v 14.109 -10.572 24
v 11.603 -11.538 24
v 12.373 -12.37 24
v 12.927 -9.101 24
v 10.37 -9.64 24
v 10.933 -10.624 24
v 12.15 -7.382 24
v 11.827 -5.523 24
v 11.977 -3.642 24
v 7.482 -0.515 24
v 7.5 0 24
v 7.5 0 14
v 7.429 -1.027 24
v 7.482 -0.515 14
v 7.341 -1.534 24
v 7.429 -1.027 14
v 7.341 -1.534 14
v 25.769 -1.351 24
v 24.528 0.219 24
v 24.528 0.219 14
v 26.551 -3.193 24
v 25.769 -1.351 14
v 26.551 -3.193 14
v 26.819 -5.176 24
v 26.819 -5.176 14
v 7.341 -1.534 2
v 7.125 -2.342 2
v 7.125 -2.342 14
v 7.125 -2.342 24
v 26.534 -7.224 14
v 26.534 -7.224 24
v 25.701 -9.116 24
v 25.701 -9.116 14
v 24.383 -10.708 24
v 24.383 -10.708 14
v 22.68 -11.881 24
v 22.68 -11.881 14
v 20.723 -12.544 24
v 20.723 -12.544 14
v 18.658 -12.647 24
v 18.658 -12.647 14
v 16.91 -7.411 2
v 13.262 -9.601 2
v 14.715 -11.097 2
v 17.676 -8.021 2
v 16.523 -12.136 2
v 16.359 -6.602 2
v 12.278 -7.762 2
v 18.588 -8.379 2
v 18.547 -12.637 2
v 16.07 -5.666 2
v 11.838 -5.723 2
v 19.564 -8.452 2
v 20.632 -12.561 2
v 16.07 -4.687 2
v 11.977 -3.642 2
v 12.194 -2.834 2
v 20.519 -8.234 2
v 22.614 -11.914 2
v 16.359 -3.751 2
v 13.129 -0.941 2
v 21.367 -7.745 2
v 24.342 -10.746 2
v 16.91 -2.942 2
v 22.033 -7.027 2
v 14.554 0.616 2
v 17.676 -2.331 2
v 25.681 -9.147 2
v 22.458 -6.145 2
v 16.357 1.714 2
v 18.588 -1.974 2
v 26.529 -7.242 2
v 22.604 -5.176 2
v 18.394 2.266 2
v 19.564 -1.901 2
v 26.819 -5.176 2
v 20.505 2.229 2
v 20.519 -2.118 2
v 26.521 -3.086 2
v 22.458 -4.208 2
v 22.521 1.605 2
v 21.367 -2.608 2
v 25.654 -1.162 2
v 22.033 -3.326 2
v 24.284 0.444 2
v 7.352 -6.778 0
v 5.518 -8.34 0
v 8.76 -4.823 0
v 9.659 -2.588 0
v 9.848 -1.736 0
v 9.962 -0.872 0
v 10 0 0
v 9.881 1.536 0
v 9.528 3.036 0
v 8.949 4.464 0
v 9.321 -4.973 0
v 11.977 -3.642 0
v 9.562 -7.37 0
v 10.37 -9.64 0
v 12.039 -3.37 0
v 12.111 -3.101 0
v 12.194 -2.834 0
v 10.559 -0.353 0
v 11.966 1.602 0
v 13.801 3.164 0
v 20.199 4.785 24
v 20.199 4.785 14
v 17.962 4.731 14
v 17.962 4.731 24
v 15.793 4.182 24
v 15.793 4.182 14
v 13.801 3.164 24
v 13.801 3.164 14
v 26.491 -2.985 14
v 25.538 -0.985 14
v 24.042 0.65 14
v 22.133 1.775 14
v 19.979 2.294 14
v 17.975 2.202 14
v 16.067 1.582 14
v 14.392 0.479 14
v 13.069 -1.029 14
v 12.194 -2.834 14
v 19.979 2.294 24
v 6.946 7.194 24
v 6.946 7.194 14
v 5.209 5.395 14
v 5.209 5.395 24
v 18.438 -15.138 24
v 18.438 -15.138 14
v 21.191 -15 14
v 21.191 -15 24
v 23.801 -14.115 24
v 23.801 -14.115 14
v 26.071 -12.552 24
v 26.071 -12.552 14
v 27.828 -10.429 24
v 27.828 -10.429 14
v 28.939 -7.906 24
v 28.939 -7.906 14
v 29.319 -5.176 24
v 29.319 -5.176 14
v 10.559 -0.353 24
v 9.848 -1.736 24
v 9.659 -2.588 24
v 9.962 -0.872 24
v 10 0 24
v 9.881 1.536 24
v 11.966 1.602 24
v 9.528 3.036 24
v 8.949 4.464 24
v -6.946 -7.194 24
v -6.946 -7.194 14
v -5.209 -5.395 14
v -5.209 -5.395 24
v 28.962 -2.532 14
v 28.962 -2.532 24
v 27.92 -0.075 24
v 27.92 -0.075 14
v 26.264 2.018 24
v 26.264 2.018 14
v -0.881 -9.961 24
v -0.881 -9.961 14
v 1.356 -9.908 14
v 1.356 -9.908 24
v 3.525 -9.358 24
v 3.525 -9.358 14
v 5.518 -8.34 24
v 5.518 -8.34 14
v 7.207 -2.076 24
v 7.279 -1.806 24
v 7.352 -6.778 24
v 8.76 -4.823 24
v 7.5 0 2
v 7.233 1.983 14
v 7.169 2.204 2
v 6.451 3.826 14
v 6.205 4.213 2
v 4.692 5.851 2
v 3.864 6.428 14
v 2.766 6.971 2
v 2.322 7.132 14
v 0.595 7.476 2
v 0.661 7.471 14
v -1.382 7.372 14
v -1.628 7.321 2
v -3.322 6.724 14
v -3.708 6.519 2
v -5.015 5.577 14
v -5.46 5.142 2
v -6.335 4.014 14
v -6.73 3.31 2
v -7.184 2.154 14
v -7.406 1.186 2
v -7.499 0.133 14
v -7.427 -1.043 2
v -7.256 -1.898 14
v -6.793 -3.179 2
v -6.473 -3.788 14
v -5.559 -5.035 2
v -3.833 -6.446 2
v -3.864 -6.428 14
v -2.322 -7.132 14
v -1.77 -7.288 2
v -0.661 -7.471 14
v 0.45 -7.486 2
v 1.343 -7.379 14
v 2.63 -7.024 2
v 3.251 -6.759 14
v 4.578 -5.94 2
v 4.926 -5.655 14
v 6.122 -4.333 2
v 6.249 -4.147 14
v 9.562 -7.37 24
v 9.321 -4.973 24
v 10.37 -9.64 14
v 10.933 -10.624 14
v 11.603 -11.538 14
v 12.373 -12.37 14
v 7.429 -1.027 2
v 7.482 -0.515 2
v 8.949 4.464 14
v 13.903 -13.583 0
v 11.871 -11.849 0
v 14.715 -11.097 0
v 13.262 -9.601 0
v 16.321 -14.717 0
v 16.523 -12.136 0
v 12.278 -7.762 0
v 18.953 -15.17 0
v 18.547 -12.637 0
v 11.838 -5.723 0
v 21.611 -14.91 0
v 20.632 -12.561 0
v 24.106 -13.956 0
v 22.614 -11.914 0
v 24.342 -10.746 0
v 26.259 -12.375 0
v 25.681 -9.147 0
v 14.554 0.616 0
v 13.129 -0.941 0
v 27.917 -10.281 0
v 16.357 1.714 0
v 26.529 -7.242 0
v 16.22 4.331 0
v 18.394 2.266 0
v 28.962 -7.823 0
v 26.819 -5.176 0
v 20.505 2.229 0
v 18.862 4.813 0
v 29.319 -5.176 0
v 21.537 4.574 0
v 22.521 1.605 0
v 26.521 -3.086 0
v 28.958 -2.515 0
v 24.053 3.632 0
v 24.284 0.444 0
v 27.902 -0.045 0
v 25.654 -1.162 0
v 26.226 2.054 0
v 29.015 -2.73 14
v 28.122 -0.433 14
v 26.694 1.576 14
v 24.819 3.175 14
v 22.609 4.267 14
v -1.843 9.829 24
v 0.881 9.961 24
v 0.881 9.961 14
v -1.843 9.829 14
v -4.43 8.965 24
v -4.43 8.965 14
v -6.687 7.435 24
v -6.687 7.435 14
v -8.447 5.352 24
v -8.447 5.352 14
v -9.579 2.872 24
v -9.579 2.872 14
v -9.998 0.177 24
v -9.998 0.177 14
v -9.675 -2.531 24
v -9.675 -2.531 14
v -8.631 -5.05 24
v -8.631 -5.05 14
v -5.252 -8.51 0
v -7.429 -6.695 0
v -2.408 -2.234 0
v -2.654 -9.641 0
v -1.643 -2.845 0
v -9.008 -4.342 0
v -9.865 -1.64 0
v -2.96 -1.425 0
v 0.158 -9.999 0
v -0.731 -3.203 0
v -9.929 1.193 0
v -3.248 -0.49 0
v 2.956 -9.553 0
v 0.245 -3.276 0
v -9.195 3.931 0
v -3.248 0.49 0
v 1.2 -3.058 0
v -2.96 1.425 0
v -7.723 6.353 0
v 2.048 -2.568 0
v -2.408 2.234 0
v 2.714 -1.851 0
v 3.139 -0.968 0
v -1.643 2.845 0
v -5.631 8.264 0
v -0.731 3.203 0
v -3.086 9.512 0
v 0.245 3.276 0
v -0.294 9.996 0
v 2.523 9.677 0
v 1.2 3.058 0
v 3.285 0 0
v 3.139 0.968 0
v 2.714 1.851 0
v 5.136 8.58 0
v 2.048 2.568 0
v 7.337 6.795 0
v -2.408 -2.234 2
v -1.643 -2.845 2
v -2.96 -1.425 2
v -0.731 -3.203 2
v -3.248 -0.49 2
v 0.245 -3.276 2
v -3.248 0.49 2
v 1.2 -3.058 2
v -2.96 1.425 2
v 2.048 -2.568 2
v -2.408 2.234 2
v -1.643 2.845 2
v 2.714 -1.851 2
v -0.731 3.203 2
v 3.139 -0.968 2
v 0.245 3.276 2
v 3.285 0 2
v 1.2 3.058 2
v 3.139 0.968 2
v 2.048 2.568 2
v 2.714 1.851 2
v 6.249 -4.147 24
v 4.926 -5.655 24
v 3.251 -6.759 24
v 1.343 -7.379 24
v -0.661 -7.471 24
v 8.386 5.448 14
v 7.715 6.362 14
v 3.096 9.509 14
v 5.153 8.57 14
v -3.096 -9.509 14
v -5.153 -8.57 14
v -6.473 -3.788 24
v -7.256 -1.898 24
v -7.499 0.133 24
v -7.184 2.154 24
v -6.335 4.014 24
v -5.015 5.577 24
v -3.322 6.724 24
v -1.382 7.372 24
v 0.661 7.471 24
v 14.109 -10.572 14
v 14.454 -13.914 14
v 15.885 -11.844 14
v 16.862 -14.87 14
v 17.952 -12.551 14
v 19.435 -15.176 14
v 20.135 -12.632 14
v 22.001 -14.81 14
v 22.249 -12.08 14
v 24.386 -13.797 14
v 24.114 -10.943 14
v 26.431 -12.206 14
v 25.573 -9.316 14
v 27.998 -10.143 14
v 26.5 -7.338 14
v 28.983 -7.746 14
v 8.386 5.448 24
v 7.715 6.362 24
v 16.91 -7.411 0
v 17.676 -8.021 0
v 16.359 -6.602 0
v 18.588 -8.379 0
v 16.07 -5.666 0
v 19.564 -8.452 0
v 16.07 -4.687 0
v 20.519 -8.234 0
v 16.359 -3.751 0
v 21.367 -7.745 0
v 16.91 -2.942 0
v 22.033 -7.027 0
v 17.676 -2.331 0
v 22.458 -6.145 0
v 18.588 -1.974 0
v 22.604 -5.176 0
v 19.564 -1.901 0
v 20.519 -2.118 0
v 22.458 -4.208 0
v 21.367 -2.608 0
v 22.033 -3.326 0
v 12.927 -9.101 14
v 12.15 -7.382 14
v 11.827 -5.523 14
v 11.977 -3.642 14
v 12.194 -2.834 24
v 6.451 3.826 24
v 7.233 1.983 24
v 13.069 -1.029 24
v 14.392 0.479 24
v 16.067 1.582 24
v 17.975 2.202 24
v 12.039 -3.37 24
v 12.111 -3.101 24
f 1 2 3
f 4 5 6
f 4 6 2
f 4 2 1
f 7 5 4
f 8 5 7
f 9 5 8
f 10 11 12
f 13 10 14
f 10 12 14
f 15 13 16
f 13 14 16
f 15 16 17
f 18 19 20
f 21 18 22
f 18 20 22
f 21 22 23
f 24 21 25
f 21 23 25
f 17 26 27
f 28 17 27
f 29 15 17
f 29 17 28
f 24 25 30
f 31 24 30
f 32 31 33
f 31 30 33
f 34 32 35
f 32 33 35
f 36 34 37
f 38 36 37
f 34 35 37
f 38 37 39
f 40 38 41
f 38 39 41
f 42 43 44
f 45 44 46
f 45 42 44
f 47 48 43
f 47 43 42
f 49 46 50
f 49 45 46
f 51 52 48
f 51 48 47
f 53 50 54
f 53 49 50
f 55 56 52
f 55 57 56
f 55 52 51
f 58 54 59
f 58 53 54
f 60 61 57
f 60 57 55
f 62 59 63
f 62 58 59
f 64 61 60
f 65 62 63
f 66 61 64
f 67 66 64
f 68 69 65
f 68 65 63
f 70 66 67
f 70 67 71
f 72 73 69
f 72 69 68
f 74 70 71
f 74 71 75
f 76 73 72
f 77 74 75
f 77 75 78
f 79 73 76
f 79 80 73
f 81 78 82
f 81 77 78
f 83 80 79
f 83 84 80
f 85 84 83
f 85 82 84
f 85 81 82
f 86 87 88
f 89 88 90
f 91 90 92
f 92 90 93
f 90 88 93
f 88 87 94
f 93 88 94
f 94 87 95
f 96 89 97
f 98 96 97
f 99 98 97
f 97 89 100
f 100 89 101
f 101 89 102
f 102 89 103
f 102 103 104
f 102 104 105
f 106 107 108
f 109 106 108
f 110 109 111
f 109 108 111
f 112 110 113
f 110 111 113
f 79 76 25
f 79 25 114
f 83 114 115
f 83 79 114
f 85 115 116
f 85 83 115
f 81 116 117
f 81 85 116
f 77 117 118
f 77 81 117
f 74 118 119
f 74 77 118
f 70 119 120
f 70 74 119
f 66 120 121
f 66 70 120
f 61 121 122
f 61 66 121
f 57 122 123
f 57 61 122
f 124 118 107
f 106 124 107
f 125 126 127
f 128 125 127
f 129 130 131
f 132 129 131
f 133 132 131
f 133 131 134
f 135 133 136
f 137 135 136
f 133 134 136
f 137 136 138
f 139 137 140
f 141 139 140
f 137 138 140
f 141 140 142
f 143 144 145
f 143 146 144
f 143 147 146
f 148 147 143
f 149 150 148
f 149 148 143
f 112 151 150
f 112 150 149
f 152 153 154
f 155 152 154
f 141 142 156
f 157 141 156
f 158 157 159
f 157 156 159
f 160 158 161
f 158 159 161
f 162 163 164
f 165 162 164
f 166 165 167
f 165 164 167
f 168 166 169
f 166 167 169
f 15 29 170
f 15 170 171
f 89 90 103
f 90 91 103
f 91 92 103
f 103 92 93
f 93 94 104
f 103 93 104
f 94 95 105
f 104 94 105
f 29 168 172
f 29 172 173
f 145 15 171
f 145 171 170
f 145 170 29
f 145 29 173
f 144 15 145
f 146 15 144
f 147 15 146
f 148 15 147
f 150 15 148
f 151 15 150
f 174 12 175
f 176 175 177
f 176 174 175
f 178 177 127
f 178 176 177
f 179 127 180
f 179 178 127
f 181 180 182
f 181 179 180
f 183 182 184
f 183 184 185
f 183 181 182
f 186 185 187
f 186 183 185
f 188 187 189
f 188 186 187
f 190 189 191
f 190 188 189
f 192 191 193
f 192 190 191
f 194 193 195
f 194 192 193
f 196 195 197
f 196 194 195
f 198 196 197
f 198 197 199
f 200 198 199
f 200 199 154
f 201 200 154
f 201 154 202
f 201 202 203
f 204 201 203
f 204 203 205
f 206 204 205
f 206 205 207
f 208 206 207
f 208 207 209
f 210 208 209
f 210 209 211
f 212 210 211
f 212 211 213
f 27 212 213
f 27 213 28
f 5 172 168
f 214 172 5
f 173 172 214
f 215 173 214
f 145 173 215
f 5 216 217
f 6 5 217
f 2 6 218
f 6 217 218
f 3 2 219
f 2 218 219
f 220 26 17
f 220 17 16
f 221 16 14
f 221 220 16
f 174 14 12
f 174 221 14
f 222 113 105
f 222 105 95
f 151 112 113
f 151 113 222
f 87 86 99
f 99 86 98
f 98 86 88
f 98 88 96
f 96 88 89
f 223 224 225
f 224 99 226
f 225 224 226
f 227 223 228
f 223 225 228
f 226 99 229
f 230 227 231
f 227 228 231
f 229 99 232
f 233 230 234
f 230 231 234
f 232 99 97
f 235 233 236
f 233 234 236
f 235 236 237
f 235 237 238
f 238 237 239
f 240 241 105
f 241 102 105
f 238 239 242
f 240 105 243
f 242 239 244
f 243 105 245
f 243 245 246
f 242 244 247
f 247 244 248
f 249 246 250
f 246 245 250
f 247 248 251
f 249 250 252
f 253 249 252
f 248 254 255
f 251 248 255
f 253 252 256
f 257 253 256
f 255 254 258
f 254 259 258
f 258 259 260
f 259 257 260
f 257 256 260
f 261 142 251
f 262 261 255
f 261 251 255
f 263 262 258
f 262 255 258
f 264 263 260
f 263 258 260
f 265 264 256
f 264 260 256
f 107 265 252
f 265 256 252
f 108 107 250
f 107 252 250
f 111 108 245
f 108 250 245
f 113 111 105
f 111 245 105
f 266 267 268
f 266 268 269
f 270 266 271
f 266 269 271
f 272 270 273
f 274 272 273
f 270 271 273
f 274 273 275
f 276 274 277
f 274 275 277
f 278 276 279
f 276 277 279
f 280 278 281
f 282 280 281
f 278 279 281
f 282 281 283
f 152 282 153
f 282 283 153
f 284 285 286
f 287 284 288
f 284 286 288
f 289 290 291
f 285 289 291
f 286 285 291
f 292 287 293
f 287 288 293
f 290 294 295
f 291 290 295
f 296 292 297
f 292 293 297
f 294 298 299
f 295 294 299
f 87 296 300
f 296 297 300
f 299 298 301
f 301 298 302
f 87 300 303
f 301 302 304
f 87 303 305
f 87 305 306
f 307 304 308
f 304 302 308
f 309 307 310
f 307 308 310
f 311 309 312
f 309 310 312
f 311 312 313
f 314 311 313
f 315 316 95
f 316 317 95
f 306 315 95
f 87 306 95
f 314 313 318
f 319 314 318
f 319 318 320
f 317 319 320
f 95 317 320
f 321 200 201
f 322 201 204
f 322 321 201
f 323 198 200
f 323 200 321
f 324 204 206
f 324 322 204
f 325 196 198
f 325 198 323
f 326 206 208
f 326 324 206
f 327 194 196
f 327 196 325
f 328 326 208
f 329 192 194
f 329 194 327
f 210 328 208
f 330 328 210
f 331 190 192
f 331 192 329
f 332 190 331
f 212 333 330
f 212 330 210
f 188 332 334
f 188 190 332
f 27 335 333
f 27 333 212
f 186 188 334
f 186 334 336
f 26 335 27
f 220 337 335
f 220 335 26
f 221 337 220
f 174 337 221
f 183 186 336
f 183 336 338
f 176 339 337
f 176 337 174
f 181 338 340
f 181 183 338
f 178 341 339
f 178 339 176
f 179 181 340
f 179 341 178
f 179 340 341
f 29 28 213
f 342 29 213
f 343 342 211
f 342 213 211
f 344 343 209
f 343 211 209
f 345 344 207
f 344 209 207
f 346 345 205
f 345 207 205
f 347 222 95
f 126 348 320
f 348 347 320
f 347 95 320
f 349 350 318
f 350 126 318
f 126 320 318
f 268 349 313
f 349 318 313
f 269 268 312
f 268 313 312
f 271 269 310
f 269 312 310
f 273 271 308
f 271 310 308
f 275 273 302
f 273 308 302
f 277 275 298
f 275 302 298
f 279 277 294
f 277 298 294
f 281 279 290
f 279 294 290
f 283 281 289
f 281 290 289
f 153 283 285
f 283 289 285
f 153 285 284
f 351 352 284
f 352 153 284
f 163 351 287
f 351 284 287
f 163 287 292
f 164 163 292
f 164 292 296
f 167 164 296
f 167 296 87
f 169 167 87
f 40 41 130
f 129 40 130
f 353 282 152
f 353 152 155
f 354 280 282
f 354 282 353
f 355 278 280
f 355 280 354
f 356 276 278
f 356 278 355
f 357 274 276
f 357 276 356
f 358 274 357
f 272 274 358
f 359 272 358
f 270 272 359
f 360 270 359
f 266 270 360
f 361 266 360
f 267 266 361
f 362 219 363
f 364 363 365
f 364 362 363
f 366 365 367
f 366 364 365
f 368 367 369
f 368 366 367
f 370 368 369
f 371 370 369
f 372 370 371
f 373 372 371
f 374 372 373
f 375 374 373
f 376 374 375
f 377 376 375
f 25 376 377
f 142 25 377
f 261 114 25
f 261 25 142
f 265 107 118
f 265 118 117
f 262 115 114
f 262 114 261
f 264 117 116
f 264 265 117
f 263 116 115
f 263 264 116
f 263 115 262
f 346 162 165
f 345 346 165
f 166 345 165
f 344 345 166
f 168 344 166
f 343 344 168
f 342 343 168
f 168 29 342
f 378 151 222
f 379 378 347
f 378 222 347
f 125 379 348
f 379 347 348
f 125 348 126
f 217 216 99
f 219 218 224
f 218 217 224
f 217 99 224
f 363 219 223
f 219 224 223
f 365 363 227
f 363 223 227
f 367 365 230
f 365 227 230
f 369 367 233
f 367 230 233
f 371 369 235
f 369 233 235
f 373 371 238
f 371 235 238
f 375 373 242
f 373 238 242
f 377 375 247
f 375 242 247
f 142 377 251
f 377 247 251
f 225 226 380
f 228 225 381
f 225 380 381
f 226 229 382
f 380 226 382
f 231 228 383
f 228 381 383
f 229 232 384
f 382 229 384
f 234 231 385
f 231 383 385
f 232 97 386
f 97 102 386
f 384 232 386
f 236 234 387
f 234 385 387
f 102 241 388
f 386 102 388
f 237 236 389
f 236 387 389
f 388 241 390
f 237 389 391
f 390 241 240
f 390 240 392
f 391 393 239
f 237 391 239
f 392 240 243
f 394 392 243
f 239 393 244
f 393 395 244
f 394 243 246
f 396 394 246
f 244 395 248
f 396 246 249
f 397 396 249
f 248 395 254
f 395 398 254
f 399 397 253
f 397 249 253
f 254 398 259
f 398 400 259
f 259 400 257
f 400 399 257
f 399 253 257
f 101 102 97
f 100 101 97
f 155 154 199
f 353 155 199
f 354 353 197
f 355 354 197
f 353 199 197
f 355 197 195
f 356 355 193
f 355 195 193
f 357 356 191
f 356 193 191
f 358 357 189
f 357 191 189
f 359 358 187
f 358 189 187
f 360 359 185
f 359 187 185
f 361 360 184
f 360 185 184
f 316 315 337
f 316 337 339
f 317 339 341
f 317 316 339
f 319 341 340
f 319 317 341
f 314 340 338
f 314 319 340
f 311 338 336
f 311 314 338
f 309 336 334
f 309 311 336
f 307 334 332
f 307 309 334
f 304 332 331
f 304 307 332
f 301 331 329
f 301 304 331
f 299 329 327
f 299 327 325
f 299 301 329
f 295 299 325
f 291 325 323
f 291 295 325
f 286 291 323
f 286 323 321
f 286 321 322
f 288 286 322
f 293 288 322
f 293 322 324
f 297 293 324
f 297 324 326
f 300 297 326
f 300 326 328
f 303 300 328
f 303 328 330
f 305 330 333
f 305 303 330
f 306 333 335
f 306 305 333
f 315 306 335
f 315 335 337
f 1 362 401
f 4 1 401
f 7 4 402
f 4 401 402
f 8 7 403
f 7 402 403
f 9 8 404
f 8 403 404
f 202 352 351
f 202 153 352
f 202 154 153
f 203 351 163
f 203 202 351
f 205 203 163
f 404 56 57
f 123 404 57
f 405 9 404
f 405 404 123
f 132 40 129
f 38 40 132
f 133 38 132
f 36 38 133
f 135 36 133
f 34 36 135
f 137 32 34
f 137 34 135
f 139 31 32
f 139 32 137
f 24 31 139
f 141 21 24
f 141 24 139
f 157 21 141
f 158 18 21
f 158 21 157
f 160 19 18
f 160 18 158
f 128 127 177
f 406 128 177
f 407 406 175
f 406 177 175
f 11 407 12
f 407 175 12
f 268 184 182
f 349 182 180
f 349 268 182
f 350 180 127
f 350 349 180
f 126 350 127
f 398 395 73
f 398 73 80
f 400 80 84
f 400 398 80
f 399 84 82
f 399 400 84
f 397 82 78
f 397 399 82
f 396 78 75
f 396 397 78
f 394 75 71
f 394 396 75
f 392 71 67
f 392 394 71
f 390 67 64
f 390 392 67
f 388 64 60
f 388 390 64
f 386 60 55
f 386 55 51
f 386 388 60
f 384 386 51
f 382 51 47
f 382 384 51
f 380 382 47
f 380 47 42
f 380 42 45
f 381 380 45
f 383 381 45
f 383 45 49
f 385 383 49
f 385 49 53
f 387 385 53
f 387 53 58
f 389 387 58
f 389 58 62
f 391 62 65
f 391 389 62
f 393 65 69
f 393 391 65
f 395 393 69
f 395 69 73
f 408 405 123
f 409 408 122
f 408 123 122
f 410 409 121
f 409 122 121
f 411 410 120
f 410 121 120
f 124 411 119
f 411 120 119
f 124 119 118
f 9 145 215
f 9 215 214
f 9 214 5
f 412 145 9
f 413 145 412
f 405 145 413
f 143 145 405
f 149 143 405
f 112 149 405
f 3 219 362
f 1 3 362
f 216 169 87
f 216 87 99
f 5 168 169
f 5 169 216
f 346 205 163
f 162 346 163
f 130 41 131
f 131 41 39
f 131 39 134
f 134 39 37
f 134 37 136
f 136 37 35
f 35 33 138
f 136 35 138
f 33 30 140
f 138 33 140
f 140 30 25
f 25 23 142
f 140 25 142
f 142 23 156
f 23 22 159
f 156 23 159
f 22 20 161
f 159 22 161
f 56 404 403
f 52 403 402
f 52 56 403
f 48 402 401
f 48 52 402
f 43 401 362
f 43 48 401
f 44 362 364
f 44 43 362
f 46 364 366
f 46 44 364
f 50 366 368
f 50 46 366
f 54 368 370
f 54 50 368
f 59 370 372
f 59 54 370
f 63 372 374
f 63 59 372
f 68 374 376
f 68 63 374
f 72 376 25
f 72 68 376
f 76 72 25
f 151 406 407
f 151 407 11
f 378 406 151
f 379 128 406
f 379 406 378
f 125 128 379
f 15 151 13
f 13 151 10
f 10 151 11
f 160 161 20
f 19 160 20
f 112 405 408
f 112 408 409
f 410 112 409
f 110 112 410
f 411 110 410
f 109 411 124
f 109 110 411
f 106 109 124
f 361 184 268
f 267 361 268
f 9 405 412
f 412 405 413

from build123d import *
from build123d.topology import SkipClean

# Parameters (mm, degrees)
SKETCH1_R             = 7.5
SKETCH1_R_2           = 3.285
BOSS_EXTRUDE1_DEPTH   = 2
BOSS_EXTRUDE1_2_DEPTH = 2
SKETCH1_3_R           = 10
SKETCH1_3_R_2         = 7.5
BOSS_EXTRUDE2_DEPTH   = 14
BOSS_EXTRUDE3_DEPTH   = 10
BOSS_EXTRUDE4_DEPTH   = 24


with BuildPart() as part:
    # Sketch1 → Boss-Extrude1 (new body)
    with BuildSketch(Plane.XY):
        Circle(SKETCH1_R)
        Circle(SKETCH1_R_2, mode=Mode.SUBTRACT)
    extrude(amount=BOSS_EXTRUDE1_DEPTH)

    # Sketch1<3> → Boss-Extrude2 (add)
    # profile 1 of 2: a face of its own
    with BuildSketch(Plane.XY):
        Circle(SKETCH1_3_R)
        Circle(SKETCH1_3_R_2, mode=Mode.SUBTRACT)
    # profile 2 of 2: a face of its own
    with BuildSketch(Plane.XY):
        with Locations((19.318516526, -5.176380902)):
            Circle(SKETCH1_3_R)
        with Locations((19.318516526, -5.176380902)):
            Circle(SKETCH1_3_R_2, mode=Mode.SUBTRACT)
    extrude(amount=BOSS_EXTRUDE2_DEPTH)


with BuildPart() as body_2:
    # Sketch1 → Boss-Extrude1 2 (new body)
    with BuildSketch(Plane.XY):
        with Locations((19.318516526, -5.176380902)):
            Circle(SKETCH1_R)
        with Locations((19.318516526, -5.176380902)):
            Circle(SKETCH1_R_2, mode=Mode.SUBTRACT)
    extrude(amount=BOSS_EXTRUDE1_2_DEPTH)



with BuildPart() as boss_extrude2_piece_1:
    # of the separate pieces the step leaves, piece 1, a body of its own (boss_extrude2_pieces)
    add(part.part.solids().sort_by_distance((3.285, 0, 0))[0])

    # Sketch2 → Boss-Extrude3 (add)
    with SkipClean():  # the faces are left unmerged after this step: merging them gives an invalid solid
        with BuildSketch(Plane.XY.offset(14)):
            with BuildLine():
                ThreePointArc((0.880723614, 9.961140794), (-9.097879067, 4.150734451), (-6.945976325, -7.193984493))
                Line((-6.945976325, -7.193984493), (-5.209482244, -5.39548837))
                ThreePointArc((-5.209482244, -5.39548837), (-6.8234093, 3.113050838), (0.66054271, 7.470855595))
                Line((0.66054271, 7.470855595), (0.880723614, 9.961140794))
            make_face()
            with BuildLine():
                ThreePointArc((20.199240139, 4.784759892), (13.586521544, 3.017777598), (9.659258283, -2.588190376))
                ThreePointArc((9.659258283, -2.588190376), (9.68232481, -7.849171431), (12.372540201, -12.370365396))
                Line((12.372540201, -12.370365396), (14.109034282, -10.571869272))
                ThreePointArc((14.109034282, -10.571869272), (12.495107225, -2.063330064), (19.979059236, 2.294474693))
                Line((19.979059236, 2.294474693), (20.199240139, 4.784759892))
            make_face()
            with BuildLine():
                Line((-0.66054271, -7.470855595), (-0.880723614, -9.961140794))
                ThreePointArc((-0.880723614, -9.961140794), (5.731995045, -8.194158456), (9.659258283, -2.588190376))
                ThreePointArc((9.659258283, -2.588190376), (9.636191695, 2.672790603), (6.945976325, 7.193984493))
                Line((6.945976325, 7.193984493), (5.209482244, 5.39548837))
                ThreePointArc((5.209482244, 5.39548837), (6.8234093, -3.113050838), (-0.66054271, -7.470855595))
            make_face()
            with BuildLine():
                ThreePointArc((18.437792912, -15.137521696), (28.416395593, -9.327115353), (26.264492851, 2.017603591))
                Line((26.264492851, 2.017603591), (24.52799877, 0.219107468))
                ThreePointArc((24.52799877, 0.219107468), (26.141925826, -8.28943174), (18.657973816, -12.647236497))
                Line((18.657973816, -12.647236497), (18.437792912, -15.137521696))
            make_face()
        extrude(amount=BOSS_EXTRUDE3_DEPTH)


with BuildPart() as boss_extrude2_piece_2:
    # of the separate pieces the step leaves, piece 2, a body of its own (boss_extrude2_pieces)
    add(part.part.solids().sort_by_distance((29.318516526, -5.176380902, 0))[0])


with BuildPart() as boss_extrude3_piece_1:
    # of the separate pieces the step leaves, piece 1, a body of its own (boss_extrude3_pieces)
    add(boss_extrude2_piece_1.part.solids().sort_by_distance((3.285, 0, 0))[0])


with BuildPart() as boss_extrude3_piece_2:
    # of the separate pieces the step leaves, piece 2, a body of its own (boss_extrude3_pieces)
    add(boss_extrude2_piece_1.part.solids().sort_by_distance((26.264492851, 2.017603591, 14))[0])


with BuildPart() as boss_extrude3_piece_3:
    # of the separate pieces the step leaves, piece 3, a body of its own (boss_extrude3_pieces)
    add(boss_extrude2_piece_1.part.solids().sort_by_distance((20.199240139, 4.784759892, 14))[0])


with BuildPart() as body_2_1:
    with SkipClean():  # the faces are left unmerged after this step: merging them gives an invalid solid
        add(body_2.part)

        add(boss_extrude2_piece_2.part)  # Boss-Extrude4 merges Boss-Extrude2 piece 2

        add(boss_extrude3_piece_1.part)  # Boss-Extrude4 merges Boss-Extrude3 piece 1

        add(boss_extrude3_piece_3.part)  # Boss-Extrude4 merges Boss-Extrude3 piece 3
        # Sketch4 → Boss-Extrude4 (add)
        with BuildSketch(Plane.XY.offset(24)):
            Polygon((13.800709497, 3.163511519), (8.948507271, 4.463655187), (5.517807029, -8.339892421), (10.370009255, -9.640036089), align=None)
        extrude(amount=-BOSS_EXTRUDE4_DEPTH)


solid = Compound([boss_extrude3_piece_2.part, body_2_1.part])
